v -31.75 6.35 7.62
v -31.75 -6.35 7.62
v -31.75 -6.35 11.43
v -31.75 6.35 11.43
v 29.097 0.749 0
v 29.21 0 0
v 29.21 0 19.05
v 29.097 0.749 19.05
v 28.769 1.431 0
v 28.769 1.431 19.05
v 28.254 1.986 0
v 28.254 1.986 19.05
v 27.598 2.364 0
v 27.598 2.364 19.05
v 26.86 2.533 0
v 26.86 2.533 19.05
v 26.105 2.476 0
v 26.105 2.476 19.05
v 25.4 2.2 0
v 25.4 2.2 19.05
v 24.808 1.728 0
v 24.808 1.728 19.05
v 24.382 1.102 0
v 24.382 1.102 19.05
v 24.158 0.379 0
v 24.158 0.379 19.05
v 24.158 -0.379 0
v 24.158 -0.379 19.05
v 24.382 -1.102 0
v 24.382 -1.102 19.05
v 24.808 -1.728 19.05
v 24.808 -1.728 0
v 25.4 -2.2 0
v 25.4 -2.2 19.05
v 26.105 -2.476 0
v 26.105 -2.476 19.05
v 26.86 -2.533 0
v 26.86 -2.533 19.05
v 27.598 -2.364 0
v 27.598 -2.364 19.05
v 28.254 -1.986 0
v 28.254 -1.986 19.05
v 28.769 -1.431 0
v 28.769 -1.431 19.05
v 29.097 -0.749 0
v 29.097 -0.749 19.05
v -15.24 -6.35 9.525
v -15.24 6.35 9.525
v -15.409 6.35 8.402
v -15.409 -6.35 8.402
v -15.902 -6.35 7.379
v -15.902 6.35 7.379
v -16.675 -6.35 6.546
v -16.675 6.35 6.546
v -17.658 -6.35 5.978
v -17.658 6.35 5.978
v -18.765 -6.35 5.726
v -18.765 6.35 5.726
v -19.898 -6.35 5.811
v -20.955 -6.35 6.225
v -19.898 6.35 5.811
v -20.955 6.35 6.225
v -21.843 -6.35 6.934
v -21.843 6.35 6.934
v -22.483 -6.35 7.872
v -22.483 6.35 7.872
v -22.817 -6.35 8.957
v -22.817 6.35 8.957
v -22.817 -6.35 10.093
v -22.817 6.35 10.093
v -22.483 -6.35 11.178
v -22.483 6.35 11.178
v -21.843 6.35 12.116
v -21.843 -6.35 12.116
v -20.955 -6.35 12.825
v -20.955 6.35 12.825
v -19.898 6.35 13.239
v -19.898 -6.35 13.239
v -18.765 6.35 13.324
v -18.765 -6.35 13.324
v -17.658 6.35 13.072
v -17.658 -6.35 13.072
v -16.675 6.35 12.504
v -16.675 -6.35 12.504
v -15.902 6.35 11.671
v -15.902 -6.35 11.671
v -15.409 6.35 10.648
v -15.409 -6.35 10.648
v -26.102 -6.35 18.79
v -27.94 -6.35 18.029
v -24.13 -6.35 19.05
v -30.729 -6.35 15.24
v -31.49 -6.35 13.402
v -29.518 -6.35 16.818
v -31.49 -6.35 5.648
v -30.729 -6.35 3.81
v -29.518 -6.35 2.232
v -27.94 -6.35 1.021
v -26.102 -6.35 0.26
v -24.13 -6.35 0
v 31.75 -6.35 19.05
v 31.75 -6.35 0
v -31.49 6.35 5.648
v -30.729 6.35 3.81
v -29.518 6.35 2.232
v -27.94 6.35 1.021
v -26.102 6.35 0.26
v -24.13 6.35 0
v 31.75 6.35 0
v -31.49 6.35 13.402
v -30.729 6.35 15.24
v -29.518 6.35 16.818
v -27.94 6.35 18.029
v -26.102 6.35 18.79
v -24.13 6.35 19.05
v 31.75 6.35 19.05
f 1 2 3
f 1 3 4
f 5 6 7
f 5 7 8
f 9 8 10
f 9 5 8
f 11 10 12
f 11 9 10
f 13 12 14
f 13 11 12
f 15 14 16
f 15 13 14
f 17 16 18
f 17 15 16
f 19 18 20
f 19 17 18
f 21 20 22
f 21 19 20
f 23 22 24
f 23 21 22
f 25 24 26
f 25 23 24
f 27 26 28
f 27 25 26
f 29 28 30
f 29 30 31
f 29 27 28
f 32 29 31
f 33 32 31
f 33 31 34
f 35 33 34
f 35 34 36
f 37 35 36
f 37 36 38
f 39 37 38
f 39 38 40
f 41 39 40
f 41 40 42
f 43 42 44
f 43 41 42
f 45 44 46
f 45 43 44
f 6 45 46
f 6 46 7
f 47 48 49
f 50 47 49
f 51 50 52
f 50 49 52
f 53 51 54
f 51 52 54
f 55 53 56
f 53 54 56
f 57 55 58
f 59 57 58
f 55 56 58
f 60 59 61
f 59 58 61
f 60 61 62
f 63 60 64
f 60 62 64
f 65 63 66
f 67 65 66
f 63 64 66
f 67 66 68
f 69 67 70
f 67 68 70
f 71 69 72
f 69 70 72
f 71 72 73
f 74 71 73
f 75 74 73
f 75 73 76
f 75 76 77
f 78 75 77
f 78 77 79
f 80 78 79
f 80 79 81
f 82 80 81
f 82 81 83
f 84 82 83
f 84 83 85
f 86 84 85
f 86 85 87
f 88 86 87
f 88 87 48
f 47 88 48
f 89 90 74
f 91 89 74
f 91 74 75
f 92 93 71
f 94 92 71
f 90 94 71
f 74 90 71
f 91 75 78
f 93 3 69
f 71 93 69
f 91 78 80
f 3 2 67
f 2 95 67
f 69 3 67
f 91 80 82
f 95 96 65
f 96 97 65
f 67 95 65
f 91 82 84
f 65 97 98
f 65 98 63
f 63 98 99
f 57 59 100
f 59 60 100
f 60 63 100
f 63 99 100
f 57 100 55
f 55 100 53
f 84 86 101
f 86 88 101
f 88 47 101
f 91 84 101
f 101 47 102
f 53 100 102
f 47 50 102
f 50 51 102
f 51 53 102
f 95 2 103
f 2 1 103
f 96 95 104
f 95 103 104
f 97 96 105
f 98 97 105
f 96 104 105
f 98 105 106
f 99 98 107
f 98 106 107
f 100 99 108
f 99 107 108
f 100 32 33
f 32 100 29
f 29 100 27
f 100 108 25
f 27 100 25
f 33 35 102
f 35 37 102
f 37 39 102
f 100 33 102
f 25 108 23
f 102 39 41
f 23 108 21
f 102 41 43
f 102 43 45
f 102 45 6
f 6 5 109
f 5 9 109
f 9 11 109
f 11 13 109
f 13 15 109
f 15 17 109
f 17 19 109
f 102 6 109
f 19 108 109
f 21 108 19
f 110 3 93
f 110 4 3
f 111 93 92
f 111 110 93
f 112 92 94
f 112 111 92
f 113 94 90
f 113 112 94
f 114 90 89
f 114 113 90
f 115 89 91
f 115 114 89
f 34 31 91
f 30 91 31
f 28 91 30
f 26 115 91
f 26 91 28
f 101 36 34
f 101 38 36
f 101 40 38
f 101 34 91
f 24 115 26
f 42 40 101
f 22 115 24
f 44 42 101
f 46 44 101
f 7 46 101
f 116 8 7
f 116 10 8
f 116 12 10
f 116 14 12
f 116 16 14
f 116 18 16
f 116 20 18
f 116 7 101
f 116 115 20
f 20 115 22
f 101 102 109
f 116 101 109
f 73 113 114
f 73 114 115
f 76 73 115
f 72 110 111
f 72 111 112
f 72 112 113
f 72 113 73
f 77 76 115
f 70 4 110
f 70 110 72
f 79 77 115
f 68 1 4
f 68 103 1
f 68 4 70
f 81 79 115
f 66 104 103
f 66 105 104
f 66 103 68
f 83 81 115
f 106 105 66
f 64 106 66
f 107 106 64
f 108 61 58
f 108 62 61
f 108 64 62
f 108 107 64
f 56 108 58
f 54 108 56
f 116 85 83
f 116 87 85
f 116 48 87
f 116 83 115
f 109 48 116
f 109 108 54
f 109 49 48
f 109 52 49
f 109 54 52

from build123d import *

# Parameters (mm, degrees)
SKETCH1_W           = 63.5
SKETCH1_H           = 12.7
SKETCH1_R           = 2.54
BOSS_EXTRUDE1_DEPTH = 19.05
CUT_EXTRUDE1_REACH  = 14.7
SKETCH2_R           = 3.81
FILLET1_R           = 7.62


with BuildPart() as part:
    # Sketch1 → Boss-Extrude1 (new body)
    with BuildSketch(Plane.XY):
        Rectangle(SKETCH1_W, SKETCH1_H)
        with Locations((26.67, 0)):
            Circle(SKETCH1_R, mode=Mode.SUBTRACT)
    extrude(amount=BOSS_EXTRUDE1_DEPTH)

    # Sketch2 → Cut-Extrude1 (cut, up to next)
    with BuildSketch(Plane(origin=(0, 6.35, 0), x_dir=(1, 0, 0), z_dir=(0, 1, 0)), mode=Mode.PRIVATE) as cut_extrude1_sk1:
        with Locations((-19.05, -9.525)):
            Circle(SKETCH2_R)
    cut_extrude1_tool1 = extrude(cut_extrude1_sk1.sketch, amount=-CUT_EXTRUDE1_REACH, mode=Mode.PRIVATE) & part.part
    add(cut_extrude1_tool1.solids().sort_by_distance((-19.05, 6.35, 9.525))[0], mode=Mode.SUBTRACT)

    # Fillet1
    fillet1_edges = [part.edges().sort_by_distance(p)[0] for p in [
        (-31.75, 0, 19.05),
        (-31.75, 0, 0),
    ]]
    fillet(fillet1_edges, radius=FILLET1_R)


solid = part.part
